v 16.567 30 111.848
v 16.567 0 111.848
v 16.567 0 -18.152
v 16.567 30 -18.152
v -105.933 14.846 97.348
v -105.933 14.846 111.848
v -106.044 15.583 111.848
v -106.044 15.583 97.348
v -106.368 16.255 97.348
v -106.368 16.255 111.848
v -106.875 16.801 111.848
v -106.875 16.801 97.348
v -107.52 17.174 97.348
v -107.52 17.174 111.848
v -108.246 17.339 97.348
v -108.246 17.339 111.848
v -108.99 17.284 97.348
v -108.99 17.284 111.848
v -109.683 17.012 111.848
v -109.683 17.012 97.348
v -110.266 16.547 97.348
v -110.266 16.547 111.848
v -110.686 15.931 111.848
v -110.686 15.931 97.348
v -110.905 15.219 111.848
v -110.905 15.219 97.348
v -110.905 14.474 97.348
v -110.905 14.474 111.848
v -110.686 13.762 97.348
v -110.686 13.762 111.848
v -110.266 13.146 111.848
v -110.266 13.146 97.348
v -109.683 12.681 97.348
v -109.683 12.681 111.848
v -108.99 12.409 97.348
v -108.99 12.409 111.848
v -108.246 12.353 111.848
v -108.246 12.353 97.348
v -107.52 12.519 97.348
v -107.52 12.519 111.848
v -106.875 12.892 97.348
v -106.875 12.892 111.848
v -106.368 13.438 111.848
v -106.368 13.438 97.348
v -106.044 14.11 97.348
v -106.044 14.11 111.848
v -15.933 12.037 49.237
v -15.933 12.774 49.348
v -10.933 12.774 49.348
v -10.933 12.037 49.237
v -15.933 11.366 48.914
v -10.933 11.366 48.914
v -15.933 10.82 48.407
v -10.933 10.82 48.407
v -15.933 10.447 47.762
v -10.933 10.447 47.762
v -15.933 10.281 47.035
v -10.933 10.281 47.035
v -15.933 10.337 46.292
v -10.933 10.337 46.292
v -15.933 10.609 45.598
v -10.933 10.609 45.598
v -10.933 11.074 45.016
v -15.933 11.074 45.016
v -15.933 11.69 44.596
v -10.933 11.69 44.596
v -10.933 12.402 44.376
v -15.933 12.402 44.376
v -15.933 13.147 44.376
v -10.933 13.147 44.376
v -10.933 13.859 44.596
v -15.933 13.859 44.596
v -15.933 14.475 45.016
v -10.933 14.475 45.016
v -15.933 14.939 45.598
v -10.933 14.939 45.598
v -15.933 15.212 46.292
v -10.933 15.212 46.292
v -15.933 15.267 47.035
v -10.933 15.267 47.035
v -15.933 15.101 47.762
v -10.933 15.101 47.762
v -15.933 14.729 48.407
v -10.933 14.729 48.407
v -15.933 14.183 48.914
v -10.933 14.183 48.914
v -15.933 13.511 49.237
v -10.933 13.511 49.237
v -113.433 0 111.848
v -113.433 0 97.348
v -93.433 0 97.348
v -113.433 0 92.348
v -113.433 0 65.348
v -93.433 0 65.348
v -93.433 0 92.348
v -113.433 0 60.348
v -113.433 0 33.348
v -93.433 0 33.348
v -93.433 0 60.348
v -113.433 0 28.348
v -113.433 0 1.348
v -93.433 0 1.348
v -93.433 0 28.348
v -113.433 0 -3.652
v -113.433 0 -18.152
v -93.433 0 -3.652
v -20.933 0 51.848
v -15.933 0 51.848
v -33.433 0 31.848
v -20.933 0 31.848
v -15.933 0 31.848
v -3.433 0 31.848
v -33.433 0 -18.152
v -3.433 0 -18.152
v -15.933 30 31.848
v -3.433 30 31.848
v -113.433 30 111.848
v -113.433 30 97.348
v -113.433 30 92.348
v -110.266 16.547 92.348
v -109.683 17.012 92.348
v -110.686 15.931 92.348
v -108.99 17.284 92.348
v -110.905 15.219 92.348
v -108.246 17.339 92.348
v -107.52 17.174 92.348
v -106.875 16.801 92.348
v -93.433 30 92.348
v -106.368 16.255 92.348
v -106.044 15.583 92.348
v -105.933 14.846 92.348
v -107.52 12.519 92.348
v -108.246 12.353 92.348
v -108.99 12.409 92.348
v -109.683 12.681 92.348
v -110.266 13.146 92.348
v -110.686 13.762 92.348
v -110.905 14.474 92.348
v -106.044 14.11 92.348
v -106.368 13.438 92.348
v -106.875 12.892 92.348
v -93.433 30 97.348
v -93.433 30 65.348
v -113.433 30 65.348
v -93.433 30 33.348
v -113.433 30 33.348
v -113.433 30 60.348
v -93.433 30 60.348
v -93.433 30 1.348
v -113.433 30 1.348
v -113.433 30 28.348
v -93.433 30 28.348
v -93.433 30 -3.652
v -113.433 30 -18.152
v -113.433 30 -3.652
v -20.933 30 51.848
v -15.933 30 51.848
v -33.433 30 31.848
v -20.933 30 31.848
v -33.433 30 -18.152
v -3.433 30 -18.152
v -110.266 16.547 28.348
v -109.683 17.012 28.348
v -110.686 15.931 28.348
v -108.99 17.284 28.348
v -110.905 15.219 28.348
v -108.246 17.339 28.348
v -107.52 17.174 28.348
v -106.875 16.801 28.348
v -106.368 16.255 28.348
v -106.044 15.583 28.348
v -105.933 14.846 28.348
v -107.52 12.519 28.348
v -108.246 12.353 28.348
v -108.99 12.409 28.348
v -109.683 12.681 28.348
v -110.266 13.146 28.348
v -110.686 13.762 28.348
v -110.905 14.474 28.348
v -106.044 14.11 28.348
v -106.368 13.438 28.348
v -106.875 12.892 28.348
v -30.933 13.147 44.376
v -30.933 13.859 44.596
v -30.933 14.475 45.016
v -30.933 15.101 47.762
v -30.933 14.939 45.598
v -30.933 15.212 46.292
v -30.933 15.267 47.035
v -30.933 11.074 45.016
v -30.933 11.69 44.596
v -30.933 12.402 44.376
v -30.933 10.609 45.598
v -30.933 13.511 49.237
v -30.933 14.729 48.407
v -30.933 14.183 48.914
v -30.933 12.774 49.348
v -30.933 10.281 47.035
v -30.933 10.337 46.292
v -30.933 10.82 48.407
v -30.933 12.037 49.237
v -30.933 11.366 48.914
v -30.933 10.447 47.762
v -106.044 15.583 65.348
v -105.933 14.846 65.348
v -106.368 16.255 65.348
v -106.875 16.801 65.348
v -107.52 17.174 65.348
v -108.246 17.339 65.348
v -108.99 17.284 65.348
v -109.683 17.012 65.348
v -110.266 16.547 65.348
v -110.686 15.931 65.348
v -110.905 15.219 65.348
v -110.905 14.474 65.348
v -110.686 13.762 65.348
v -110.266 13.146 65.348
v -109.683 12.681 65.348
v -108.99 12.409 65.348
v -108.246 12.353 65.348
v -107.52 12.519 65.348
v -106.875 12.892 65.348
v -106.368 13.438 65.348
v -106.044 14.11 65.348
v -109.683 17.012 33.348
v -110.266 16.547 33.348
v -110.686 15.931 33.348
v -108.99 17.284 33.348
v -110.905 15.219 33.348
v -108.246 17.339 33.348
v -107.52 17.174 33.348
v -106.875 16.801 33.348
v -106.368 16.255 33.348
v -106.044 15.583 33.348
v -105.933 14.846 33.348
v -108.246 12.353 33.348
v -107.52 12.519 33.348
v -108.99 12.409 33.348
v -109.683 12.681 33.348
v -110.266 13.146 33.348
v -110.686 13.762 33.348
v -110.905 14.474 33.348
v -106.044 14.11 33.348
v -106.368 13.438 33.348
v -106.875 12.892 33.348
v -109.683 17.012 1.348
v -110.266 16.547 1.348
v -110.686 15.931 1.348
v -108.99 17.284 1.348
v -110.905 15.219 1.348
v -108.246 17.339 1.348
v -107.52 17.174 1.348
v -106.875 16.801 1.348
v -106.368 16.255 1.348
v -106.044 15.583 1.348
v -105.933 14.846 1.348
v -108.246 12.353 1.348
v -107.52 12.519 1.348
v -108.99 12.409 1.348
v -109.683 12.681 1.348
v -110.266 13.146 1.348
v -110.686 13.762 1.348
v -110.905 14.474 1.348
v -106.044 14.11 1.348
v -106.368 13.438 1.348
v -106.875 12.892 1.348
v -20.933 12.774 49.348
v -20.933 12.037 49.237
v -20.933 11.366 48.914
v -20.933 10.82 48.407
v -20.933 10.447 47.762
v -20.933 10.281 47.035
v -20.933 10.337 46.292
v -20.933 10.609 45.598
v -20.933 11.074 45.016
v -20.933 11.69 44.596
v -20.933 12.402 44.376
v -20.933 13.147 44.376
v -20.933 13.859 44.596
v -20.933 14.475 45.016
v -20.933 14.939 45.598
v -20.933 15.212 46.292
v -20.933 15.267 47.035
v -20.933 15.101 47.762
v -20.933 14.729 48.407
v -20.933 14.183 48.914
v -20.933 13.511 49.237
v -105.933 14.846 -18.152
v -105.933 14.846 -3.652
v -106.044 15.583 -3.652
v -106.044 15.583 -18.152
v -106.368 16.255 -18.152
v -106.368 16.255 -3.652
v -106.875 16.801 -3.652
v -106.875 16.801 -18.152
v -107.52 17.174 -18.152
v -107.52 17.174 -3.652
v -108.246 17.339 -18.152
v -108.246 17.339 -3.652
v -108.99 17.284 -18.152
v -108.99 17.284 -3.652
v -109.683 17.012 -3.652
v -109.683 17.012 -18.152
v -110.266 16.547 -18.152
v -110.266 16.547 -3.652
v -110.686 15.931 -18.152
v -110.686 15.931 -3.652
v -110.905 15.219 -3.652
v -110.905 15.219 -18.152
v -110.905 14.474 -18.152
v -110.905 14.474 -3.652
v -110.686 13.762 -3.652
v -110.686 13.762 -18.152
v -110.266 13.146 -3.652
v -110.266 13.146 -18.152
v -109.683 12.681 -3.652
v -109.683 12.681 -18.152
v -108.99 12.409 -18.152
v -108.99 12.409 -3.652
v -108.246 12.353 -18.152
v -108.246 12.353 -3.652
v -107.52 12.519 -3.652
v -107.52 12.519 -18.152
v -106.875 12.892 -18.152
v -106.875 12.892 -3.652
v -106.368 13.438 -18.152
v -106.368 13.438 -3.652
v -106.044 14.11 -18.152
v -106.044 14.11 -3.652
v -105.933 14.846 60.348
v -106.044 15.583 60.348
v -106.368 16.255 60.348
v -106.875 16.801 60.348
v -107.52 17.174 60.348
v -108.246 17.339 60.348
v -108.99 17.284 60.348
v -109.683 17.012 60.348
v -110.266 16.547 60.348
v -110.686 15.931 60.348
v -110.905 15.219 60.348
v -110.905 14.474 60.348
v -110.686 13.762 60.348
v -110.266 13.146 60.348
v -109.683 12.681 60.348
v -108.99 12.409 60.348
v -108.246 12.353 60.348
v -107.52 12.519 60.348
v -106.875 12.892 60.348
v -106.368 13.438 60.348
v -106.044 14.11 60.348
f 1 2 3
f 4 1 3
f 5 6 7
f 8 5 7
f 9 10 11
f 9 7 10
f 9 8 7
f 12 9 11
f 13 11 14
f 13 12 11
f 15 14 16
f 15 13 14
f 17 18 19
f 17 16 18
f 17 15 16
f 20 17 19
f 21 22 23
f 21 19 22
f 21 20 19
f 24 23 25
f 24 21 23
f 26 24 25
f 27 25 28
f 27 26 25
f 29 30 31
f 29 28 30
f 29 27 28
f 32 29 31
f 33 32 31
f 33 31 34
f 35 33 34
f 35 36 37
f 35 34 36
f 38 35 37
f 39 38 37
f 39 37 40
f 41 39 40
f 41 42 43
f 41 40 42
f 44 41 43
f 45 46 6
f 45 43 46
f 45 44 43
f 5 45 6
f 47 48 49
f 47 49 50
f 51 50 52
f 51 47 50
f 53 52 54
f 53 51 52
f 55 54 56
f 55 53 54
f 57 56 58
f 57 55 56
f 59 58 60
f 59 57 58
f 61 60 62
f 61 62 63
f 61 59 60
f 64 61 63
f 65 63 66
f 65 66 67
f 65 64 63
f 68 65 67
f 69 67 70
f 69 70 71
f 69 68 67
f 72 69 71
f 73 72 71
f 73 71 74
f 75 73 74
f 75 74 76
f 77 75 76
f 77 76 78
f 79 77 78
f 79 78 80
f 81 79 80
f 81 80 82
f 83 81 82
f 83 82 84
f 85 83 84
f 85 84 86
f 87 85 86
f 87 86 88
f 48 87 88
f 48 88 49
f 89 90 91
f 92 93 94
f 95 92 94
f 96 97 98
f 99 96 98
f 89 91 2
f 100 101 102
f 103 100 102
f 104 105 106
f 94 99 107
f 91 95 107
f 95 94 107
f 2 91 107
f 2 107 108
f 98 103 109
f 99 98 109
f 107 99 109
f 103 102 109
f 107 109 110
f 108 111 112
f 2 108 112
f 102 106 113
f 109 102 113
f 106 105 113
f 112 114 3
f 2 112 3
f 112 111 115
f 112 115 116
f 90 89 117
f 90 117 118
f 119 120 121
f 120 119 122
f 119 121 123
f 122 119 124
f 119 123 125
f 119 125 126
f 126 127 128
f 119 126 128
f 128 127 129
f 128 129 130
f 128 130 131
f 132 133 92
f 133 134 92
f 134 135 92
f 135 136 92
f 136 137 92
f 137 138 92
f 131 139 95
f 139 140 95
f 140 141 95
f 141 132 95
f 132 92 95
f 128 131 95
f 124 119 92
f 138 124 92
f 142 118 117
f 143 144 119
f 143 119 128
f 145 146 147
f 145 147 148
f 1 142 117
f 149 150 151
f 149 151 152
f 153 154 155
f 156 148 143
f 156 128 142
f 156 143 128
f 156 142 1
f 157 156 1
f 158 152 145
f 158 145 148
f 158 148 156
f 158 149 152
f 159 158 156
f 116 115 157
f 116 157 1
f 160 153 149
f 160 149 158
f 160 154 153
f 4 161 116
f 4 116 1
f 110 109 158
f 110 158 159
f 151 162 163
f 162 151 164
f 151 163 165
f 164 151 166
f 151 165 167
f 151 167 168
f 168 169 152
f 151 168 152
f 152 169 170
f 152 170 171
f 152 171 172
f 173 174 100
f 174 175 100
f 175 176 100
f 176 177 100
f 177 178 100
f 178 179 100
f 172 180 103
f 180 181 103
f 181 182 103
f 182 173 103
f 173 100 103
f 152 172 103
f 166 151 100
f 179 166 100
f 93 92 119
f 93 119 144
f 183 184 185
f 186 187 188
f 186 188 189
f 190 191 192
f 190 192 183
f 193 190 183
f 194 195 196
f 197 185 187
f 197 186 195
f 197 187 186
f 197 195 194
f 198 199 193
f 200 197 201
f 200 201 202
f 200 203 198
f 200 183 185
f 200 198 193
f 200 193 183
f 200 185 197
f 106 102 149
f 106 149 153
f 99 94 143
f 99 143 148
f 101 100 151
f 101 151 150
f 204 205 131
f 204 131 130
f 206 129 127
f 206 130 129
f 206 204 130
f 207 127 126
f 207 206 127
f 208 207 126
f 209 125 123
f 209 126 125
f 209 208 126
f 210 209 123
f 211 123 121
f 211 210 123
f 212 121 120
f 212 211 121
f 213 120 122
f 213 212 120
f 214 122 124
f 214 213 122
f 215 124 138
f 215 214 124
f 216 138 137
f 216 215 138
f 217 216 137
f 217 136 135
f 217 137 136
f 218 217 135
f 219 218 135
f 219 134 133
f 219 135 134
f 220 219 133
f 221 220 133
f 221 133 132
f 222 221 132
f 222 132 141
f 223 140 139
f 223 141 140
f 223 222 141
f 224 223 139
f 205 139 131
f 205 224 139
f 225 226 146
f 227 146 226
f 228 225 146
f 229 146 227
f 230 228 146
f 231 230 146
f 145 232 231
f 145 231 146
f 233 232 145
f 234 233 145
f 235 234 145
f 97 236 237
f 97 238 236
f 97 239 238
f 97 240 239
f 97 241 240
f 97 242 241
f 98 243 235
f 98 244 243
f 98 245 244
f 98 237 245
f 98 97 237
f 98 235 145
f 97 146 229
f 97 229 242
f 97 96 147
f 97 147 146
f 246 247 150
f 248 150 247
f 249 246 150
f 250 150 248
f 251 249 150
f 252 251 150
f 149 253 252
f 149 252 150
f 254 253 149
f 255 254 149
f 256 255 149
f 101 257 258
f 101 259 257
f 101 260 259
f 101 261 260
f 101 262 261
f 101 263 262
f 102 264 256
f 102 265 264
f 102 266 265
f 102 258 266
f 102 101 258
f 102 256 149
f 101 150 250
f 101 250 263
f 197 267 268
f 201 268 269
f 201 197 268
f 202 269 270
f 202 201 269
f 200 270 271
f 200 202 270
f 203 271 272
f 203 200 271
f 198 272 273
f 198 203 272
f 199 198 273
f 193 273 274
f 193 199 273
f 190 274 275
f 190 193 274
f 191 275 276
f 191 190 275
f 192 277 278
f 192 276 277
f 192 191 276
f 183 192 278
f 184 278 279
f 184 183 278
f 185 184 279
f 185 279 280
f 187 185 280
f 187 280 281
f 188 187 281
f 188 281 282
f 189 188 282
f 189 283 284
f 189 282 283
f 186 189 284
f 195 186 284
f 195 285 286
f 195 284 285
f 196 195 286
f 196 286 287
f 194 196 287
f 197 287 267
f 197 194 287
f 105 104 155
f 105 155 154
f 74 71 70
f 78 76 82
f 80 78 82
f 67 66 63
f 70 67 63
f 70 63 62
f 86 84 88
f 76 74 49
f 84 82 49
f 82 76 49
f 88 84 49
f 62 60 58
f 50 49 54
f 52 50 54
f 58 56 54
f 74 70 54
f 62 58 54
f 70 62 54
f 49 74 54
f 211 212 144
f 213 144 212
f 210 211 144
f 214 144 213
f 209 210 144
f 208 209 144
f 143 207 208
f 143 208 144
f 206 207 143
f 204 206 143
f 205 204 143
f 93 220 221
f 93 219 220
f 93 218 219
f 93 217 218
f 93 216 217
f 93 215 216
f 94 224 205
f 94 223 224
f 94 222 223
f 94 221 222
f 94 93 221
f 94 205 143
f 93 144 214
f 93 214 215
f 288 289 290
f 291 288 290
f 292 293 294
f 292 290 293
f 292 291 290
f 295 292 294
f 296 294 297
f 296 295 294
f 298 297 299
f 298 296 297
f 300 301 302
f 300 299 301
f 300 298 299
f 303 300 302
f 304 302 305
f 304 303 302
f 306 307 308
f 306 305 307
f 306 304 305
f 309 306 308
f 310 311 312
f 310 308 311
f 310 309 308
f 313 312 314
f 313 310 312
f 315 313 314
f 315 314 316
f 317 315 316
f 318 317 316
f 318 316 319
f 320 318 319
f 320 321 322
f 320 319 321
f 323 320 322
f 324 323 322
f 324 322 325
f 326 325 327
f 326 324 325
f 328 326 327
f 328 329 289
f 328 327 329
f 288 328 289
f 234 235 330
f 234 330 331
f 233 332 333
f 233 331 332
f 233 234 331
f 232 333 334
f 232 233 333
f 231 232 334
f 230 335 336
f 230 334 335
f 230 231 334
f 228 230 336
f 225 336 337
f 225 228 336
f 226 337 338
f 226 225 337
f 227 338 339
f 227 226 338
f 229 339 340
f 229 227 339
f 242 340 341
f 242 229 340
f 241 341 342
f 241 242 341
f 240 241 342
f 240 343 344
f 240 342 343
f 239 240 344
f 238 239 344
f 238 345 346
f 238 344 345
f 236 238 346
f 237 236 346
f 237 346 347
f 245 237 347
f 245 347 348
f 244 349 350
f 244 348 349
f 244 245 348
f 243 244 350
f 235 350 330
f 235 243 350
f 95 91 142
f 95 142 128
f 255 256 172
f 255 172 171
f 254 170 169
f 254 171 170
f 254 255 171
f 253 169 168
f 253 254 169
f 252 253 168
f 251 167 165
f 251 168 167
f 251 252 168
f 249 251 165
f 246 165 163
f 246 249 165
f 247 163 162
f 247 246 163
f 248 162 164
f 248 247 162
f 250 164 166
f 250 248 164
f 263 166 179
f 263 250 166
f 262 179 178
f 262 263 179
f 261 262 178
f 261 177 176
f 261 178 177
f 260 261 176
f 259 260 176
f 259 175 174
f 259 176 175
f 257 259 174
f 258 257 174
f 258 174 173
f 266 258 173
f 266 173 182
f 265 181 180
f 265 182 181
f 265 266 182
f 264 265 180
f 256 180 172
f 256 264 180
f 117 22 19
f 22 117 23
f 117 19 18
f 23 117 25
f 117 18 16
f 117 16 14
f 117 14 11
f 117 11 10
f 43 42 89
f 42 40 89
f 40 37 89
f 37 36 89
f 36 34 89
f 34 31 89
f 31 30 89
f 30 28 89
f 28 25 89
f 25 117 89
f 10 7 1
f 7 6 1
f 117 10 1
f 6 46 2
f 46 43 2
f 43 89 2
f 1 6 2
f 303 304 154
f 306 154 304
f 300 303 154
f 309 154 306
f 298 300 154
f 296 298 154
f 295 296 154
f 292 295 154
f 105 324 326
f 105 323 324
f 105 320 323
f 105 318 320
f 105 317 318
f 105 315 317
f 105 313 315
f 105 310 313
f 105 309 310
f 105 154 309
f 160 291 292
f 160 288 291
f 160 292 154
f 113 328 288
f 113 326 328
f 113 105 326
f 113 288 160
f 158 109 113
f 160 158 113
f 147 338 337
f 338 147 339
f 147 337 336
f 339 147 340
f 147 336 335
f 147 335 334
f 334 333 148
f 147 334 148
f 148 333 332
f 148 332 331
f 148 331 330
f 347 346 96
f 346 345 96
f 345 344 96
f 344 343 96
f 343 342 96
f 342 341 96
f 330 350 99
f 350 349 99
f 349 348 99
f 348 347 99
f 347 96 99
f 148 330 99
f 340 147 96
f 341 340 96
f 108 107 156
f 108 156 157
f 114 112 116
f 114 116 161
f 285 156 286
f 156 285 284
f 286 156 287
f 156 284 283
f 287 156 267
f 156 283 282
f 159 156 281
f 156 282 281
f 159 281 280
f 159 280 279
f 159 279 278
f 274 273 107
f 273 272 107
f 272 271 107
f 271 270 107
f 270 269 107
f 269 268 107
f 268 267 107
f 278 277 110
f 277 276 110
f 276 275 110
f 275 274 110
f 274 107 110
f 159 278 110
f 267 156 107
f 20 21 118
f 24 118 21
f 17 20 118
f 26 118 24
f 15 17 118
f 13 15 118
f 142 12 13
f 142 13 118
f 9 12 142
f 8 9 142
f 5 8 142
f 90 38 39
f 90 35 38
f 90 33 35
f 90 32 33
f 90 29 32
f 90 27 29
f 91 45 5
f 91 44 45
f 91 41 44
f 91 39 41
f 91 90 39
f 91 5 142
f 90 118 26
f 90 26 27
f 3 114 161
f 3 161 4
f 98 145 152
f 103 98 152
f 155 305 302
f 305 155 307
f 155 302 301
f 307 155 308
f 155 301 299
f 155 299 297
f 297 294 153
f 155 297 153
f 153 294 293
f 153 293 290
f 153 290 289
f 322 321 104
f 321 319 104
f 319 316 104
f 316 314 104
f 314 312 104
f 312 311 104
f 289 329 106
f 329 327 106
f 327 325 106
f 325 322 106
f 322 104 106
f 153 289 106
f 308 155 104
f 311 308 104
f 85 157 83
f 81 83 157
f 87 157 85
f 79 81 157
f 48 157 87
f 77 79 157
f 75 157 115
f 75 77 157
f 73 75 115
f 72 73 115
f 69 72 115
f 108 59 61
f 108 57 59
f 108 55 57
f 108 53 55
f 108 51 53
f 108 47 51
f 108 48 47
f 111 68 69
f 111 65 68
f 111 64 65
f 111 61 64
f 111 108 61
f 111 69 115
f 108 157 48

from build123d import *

# Parameters (mm, degrees)
SKETCH2_W               = 130
SKETCH2_H               = 130
BOSS_EXTRUDE1_DEPTH     = 30
CUT_EXTRUDE1_DEPTH      = 163.102342109
CUT_EXTRUDE1_DEPTH_BACK = 163.102342109
SKETCH3_W               = 20
SKETCH3_H               = 5
CUT_EXTRUDE2_DEPTH      = 163.102342109
CUT_EXTRUDE2_DEPTH_BACK = 163.102342109
SKETCH8_W               = 20
SKETCH8_H               = 5
CUT_EXTRUDE3_DEPTH      = 176.12028954
CUT_EXTRUDE3_DEPTH_BACK = 176.12028954
SKETCH9_R               = 2.5
CUT_EXTRUDE4_DEPTH      = 163.102342109
CUT_EXTRUDE4_DEPTH_BACK = 163.102342109
SKETCH10_W              = 30
SKETCH10_H              = 50
CUT_EXTRUDE5_DEPTH      = 163.102342109
CUT_EXTRUDE5_DEPTH_BACK = 163.102342109
SKETCH12_W              = 5
SKETCH12_H              = 20
CUT_EXTRUDE6_DEPTH      = 10
CUT_EXTRUDE6_DEPTH_BACK = 10
SKETCH13_R              = 2.5


with BuildPart() as part:
    # Sketch2 → Boss-Extrude1 (new body)
    with BuildSketch(Plane(origin=(0, 0, 0), x_dir=(1, 0, 0), z_dir=(0, 1, 0))):
        with Locations((-48.433309961, -46.848350496)):
            Rectangle(SKETCH2_W, SKETCH2_H)
    extrude(amount=BOSS_EXTRUDE1_DEPTH)

    # Sketch3 → Cut-Extrude1 (cut, two sides: drawn at the far end of the back side and taken through both)
    with BuildSketch(Plane(origin=(0, 30, 0), x_dir=(1, 0, 0), z_dir=(0, 1, 0)).offset(-CUT_EXTRUDE1_DEPTH_BACK)):
        with Locations((-103.433309961, 1.151649504)):
            Rectangle(SKETCH3_W, SKETCH3_H)
    extrude(amount=CUT_EXTRUDE1_DEPTH + CUT_EXTRUDE1_DEPTH_BACK, mode=Mode.SUBTRACT)

    # Sketch8 → Cut-Extrude2 (cut, two sides: drawn at the far end of the back side and taken through both)
    with BuildSketch(Plane(origin=(0, 30, 0), x_dir=(1, 0, 0), z_dir=(0, 1, 0)).offset(-CUT_EXTRUDE2_DEPTH_BACK)):
        with Locations((-103.433309961, -30.848350496)):
            Rectangle(SKETCH8_W, SKETCH8_H)
        with Locations((-103.433309961, -62.848350496)):
            Rectangle(SKETCH8_W, SKETCH8_H)
        with Locations((-103.433309961, -94.848350496)):
            Rectangle(SKETCH8_W, SKETCH8_H)
    extrude(amount=CUT_EXTRUDE2_DEPTH + CUT_EXTRUDE2_DEPTH_BACK, mode=Mode.SUBTRACT)

    # Sketch9 → Cut-Extrude3 (cut, two sides: drawn at the far end of the back side and taken through both)
    with BuildSketch(Plane.XY.offset(111.848350496).offset(-CUT_EXTRUDE3_DEPTH_BACK)):
        with Locations((-108.433309961, 14.846459041)):
            Circle(SKETCH9_R)
    extrude(amount=CUT_EXTRUDE3_DEPTH + CUT_EXTRUDE3_DEPTH_BACK, mode=Mode.SUBTRACT)

    # Sketch10 → Cut-Extrude4 (cut, two sides: drawn at the far end of the back side and taken through both)
    with BuildSketch(Plane(origin=(0, 30, 0), x_dir=(1, 0, 0), z_dir=(0, 1, 0)).offset(-CUT_EXTRUDE4_DEPTH_BACK)):
        with Locations((-18.433309961, -6.848350496)):
            Rectangle(SKETCH10_W, SKETCH10_H)
    extrude(amount=CUT_EXTRUDE4_DEPTH + CUT_EXTRUDE4_DEPTH_BACK, mode=Mode.SUBTRACT)

    # Sketch12 → Cut-Extrude5 (cut, two sides: drawn at the far end of the back side and taken through both)
    with BuildSketch(Plane(origin=(0, 30, 0), x_dir=(1, 0, 0), z_dir=(0, 1, 0)).offset(-CUT_EXTRUDE5_DEPTH_BACK)):
        with Locations((-18.433309961, -41.848350496)):
            Rectangle(SKETCH12_W, SKETCH12_H)
    extrude(amount=CUT_EXTRUDE5_DEPTH + CUT_EXTRUDE5_DEPTH_BACK, mode=Mode.SUBTRACT)

    # Sketch13 → Cut-Extrude6 (cut, two sides: drawn at the far end of the back side and taken through both)
    with BuildSketch(Plane(origin=(-20.933309961, 0, 0), x_dir=(0, 0, -1), z_dir=(1, 0, 0)).offset(-CUT_EXTRUDE6_DEPTH_BACK)):
        with Locations(Location((-46.848350496, 12.77430984, 0), (0, 0, 180))):
            Circle(SKETCH13_R)
    extrude(amount=CUT_EXTRUDE6_DEPTH + CUT_EXTRUDE6_DEPTH_BACK, mode=Mode.SUBTRACT)


solid = part.part
